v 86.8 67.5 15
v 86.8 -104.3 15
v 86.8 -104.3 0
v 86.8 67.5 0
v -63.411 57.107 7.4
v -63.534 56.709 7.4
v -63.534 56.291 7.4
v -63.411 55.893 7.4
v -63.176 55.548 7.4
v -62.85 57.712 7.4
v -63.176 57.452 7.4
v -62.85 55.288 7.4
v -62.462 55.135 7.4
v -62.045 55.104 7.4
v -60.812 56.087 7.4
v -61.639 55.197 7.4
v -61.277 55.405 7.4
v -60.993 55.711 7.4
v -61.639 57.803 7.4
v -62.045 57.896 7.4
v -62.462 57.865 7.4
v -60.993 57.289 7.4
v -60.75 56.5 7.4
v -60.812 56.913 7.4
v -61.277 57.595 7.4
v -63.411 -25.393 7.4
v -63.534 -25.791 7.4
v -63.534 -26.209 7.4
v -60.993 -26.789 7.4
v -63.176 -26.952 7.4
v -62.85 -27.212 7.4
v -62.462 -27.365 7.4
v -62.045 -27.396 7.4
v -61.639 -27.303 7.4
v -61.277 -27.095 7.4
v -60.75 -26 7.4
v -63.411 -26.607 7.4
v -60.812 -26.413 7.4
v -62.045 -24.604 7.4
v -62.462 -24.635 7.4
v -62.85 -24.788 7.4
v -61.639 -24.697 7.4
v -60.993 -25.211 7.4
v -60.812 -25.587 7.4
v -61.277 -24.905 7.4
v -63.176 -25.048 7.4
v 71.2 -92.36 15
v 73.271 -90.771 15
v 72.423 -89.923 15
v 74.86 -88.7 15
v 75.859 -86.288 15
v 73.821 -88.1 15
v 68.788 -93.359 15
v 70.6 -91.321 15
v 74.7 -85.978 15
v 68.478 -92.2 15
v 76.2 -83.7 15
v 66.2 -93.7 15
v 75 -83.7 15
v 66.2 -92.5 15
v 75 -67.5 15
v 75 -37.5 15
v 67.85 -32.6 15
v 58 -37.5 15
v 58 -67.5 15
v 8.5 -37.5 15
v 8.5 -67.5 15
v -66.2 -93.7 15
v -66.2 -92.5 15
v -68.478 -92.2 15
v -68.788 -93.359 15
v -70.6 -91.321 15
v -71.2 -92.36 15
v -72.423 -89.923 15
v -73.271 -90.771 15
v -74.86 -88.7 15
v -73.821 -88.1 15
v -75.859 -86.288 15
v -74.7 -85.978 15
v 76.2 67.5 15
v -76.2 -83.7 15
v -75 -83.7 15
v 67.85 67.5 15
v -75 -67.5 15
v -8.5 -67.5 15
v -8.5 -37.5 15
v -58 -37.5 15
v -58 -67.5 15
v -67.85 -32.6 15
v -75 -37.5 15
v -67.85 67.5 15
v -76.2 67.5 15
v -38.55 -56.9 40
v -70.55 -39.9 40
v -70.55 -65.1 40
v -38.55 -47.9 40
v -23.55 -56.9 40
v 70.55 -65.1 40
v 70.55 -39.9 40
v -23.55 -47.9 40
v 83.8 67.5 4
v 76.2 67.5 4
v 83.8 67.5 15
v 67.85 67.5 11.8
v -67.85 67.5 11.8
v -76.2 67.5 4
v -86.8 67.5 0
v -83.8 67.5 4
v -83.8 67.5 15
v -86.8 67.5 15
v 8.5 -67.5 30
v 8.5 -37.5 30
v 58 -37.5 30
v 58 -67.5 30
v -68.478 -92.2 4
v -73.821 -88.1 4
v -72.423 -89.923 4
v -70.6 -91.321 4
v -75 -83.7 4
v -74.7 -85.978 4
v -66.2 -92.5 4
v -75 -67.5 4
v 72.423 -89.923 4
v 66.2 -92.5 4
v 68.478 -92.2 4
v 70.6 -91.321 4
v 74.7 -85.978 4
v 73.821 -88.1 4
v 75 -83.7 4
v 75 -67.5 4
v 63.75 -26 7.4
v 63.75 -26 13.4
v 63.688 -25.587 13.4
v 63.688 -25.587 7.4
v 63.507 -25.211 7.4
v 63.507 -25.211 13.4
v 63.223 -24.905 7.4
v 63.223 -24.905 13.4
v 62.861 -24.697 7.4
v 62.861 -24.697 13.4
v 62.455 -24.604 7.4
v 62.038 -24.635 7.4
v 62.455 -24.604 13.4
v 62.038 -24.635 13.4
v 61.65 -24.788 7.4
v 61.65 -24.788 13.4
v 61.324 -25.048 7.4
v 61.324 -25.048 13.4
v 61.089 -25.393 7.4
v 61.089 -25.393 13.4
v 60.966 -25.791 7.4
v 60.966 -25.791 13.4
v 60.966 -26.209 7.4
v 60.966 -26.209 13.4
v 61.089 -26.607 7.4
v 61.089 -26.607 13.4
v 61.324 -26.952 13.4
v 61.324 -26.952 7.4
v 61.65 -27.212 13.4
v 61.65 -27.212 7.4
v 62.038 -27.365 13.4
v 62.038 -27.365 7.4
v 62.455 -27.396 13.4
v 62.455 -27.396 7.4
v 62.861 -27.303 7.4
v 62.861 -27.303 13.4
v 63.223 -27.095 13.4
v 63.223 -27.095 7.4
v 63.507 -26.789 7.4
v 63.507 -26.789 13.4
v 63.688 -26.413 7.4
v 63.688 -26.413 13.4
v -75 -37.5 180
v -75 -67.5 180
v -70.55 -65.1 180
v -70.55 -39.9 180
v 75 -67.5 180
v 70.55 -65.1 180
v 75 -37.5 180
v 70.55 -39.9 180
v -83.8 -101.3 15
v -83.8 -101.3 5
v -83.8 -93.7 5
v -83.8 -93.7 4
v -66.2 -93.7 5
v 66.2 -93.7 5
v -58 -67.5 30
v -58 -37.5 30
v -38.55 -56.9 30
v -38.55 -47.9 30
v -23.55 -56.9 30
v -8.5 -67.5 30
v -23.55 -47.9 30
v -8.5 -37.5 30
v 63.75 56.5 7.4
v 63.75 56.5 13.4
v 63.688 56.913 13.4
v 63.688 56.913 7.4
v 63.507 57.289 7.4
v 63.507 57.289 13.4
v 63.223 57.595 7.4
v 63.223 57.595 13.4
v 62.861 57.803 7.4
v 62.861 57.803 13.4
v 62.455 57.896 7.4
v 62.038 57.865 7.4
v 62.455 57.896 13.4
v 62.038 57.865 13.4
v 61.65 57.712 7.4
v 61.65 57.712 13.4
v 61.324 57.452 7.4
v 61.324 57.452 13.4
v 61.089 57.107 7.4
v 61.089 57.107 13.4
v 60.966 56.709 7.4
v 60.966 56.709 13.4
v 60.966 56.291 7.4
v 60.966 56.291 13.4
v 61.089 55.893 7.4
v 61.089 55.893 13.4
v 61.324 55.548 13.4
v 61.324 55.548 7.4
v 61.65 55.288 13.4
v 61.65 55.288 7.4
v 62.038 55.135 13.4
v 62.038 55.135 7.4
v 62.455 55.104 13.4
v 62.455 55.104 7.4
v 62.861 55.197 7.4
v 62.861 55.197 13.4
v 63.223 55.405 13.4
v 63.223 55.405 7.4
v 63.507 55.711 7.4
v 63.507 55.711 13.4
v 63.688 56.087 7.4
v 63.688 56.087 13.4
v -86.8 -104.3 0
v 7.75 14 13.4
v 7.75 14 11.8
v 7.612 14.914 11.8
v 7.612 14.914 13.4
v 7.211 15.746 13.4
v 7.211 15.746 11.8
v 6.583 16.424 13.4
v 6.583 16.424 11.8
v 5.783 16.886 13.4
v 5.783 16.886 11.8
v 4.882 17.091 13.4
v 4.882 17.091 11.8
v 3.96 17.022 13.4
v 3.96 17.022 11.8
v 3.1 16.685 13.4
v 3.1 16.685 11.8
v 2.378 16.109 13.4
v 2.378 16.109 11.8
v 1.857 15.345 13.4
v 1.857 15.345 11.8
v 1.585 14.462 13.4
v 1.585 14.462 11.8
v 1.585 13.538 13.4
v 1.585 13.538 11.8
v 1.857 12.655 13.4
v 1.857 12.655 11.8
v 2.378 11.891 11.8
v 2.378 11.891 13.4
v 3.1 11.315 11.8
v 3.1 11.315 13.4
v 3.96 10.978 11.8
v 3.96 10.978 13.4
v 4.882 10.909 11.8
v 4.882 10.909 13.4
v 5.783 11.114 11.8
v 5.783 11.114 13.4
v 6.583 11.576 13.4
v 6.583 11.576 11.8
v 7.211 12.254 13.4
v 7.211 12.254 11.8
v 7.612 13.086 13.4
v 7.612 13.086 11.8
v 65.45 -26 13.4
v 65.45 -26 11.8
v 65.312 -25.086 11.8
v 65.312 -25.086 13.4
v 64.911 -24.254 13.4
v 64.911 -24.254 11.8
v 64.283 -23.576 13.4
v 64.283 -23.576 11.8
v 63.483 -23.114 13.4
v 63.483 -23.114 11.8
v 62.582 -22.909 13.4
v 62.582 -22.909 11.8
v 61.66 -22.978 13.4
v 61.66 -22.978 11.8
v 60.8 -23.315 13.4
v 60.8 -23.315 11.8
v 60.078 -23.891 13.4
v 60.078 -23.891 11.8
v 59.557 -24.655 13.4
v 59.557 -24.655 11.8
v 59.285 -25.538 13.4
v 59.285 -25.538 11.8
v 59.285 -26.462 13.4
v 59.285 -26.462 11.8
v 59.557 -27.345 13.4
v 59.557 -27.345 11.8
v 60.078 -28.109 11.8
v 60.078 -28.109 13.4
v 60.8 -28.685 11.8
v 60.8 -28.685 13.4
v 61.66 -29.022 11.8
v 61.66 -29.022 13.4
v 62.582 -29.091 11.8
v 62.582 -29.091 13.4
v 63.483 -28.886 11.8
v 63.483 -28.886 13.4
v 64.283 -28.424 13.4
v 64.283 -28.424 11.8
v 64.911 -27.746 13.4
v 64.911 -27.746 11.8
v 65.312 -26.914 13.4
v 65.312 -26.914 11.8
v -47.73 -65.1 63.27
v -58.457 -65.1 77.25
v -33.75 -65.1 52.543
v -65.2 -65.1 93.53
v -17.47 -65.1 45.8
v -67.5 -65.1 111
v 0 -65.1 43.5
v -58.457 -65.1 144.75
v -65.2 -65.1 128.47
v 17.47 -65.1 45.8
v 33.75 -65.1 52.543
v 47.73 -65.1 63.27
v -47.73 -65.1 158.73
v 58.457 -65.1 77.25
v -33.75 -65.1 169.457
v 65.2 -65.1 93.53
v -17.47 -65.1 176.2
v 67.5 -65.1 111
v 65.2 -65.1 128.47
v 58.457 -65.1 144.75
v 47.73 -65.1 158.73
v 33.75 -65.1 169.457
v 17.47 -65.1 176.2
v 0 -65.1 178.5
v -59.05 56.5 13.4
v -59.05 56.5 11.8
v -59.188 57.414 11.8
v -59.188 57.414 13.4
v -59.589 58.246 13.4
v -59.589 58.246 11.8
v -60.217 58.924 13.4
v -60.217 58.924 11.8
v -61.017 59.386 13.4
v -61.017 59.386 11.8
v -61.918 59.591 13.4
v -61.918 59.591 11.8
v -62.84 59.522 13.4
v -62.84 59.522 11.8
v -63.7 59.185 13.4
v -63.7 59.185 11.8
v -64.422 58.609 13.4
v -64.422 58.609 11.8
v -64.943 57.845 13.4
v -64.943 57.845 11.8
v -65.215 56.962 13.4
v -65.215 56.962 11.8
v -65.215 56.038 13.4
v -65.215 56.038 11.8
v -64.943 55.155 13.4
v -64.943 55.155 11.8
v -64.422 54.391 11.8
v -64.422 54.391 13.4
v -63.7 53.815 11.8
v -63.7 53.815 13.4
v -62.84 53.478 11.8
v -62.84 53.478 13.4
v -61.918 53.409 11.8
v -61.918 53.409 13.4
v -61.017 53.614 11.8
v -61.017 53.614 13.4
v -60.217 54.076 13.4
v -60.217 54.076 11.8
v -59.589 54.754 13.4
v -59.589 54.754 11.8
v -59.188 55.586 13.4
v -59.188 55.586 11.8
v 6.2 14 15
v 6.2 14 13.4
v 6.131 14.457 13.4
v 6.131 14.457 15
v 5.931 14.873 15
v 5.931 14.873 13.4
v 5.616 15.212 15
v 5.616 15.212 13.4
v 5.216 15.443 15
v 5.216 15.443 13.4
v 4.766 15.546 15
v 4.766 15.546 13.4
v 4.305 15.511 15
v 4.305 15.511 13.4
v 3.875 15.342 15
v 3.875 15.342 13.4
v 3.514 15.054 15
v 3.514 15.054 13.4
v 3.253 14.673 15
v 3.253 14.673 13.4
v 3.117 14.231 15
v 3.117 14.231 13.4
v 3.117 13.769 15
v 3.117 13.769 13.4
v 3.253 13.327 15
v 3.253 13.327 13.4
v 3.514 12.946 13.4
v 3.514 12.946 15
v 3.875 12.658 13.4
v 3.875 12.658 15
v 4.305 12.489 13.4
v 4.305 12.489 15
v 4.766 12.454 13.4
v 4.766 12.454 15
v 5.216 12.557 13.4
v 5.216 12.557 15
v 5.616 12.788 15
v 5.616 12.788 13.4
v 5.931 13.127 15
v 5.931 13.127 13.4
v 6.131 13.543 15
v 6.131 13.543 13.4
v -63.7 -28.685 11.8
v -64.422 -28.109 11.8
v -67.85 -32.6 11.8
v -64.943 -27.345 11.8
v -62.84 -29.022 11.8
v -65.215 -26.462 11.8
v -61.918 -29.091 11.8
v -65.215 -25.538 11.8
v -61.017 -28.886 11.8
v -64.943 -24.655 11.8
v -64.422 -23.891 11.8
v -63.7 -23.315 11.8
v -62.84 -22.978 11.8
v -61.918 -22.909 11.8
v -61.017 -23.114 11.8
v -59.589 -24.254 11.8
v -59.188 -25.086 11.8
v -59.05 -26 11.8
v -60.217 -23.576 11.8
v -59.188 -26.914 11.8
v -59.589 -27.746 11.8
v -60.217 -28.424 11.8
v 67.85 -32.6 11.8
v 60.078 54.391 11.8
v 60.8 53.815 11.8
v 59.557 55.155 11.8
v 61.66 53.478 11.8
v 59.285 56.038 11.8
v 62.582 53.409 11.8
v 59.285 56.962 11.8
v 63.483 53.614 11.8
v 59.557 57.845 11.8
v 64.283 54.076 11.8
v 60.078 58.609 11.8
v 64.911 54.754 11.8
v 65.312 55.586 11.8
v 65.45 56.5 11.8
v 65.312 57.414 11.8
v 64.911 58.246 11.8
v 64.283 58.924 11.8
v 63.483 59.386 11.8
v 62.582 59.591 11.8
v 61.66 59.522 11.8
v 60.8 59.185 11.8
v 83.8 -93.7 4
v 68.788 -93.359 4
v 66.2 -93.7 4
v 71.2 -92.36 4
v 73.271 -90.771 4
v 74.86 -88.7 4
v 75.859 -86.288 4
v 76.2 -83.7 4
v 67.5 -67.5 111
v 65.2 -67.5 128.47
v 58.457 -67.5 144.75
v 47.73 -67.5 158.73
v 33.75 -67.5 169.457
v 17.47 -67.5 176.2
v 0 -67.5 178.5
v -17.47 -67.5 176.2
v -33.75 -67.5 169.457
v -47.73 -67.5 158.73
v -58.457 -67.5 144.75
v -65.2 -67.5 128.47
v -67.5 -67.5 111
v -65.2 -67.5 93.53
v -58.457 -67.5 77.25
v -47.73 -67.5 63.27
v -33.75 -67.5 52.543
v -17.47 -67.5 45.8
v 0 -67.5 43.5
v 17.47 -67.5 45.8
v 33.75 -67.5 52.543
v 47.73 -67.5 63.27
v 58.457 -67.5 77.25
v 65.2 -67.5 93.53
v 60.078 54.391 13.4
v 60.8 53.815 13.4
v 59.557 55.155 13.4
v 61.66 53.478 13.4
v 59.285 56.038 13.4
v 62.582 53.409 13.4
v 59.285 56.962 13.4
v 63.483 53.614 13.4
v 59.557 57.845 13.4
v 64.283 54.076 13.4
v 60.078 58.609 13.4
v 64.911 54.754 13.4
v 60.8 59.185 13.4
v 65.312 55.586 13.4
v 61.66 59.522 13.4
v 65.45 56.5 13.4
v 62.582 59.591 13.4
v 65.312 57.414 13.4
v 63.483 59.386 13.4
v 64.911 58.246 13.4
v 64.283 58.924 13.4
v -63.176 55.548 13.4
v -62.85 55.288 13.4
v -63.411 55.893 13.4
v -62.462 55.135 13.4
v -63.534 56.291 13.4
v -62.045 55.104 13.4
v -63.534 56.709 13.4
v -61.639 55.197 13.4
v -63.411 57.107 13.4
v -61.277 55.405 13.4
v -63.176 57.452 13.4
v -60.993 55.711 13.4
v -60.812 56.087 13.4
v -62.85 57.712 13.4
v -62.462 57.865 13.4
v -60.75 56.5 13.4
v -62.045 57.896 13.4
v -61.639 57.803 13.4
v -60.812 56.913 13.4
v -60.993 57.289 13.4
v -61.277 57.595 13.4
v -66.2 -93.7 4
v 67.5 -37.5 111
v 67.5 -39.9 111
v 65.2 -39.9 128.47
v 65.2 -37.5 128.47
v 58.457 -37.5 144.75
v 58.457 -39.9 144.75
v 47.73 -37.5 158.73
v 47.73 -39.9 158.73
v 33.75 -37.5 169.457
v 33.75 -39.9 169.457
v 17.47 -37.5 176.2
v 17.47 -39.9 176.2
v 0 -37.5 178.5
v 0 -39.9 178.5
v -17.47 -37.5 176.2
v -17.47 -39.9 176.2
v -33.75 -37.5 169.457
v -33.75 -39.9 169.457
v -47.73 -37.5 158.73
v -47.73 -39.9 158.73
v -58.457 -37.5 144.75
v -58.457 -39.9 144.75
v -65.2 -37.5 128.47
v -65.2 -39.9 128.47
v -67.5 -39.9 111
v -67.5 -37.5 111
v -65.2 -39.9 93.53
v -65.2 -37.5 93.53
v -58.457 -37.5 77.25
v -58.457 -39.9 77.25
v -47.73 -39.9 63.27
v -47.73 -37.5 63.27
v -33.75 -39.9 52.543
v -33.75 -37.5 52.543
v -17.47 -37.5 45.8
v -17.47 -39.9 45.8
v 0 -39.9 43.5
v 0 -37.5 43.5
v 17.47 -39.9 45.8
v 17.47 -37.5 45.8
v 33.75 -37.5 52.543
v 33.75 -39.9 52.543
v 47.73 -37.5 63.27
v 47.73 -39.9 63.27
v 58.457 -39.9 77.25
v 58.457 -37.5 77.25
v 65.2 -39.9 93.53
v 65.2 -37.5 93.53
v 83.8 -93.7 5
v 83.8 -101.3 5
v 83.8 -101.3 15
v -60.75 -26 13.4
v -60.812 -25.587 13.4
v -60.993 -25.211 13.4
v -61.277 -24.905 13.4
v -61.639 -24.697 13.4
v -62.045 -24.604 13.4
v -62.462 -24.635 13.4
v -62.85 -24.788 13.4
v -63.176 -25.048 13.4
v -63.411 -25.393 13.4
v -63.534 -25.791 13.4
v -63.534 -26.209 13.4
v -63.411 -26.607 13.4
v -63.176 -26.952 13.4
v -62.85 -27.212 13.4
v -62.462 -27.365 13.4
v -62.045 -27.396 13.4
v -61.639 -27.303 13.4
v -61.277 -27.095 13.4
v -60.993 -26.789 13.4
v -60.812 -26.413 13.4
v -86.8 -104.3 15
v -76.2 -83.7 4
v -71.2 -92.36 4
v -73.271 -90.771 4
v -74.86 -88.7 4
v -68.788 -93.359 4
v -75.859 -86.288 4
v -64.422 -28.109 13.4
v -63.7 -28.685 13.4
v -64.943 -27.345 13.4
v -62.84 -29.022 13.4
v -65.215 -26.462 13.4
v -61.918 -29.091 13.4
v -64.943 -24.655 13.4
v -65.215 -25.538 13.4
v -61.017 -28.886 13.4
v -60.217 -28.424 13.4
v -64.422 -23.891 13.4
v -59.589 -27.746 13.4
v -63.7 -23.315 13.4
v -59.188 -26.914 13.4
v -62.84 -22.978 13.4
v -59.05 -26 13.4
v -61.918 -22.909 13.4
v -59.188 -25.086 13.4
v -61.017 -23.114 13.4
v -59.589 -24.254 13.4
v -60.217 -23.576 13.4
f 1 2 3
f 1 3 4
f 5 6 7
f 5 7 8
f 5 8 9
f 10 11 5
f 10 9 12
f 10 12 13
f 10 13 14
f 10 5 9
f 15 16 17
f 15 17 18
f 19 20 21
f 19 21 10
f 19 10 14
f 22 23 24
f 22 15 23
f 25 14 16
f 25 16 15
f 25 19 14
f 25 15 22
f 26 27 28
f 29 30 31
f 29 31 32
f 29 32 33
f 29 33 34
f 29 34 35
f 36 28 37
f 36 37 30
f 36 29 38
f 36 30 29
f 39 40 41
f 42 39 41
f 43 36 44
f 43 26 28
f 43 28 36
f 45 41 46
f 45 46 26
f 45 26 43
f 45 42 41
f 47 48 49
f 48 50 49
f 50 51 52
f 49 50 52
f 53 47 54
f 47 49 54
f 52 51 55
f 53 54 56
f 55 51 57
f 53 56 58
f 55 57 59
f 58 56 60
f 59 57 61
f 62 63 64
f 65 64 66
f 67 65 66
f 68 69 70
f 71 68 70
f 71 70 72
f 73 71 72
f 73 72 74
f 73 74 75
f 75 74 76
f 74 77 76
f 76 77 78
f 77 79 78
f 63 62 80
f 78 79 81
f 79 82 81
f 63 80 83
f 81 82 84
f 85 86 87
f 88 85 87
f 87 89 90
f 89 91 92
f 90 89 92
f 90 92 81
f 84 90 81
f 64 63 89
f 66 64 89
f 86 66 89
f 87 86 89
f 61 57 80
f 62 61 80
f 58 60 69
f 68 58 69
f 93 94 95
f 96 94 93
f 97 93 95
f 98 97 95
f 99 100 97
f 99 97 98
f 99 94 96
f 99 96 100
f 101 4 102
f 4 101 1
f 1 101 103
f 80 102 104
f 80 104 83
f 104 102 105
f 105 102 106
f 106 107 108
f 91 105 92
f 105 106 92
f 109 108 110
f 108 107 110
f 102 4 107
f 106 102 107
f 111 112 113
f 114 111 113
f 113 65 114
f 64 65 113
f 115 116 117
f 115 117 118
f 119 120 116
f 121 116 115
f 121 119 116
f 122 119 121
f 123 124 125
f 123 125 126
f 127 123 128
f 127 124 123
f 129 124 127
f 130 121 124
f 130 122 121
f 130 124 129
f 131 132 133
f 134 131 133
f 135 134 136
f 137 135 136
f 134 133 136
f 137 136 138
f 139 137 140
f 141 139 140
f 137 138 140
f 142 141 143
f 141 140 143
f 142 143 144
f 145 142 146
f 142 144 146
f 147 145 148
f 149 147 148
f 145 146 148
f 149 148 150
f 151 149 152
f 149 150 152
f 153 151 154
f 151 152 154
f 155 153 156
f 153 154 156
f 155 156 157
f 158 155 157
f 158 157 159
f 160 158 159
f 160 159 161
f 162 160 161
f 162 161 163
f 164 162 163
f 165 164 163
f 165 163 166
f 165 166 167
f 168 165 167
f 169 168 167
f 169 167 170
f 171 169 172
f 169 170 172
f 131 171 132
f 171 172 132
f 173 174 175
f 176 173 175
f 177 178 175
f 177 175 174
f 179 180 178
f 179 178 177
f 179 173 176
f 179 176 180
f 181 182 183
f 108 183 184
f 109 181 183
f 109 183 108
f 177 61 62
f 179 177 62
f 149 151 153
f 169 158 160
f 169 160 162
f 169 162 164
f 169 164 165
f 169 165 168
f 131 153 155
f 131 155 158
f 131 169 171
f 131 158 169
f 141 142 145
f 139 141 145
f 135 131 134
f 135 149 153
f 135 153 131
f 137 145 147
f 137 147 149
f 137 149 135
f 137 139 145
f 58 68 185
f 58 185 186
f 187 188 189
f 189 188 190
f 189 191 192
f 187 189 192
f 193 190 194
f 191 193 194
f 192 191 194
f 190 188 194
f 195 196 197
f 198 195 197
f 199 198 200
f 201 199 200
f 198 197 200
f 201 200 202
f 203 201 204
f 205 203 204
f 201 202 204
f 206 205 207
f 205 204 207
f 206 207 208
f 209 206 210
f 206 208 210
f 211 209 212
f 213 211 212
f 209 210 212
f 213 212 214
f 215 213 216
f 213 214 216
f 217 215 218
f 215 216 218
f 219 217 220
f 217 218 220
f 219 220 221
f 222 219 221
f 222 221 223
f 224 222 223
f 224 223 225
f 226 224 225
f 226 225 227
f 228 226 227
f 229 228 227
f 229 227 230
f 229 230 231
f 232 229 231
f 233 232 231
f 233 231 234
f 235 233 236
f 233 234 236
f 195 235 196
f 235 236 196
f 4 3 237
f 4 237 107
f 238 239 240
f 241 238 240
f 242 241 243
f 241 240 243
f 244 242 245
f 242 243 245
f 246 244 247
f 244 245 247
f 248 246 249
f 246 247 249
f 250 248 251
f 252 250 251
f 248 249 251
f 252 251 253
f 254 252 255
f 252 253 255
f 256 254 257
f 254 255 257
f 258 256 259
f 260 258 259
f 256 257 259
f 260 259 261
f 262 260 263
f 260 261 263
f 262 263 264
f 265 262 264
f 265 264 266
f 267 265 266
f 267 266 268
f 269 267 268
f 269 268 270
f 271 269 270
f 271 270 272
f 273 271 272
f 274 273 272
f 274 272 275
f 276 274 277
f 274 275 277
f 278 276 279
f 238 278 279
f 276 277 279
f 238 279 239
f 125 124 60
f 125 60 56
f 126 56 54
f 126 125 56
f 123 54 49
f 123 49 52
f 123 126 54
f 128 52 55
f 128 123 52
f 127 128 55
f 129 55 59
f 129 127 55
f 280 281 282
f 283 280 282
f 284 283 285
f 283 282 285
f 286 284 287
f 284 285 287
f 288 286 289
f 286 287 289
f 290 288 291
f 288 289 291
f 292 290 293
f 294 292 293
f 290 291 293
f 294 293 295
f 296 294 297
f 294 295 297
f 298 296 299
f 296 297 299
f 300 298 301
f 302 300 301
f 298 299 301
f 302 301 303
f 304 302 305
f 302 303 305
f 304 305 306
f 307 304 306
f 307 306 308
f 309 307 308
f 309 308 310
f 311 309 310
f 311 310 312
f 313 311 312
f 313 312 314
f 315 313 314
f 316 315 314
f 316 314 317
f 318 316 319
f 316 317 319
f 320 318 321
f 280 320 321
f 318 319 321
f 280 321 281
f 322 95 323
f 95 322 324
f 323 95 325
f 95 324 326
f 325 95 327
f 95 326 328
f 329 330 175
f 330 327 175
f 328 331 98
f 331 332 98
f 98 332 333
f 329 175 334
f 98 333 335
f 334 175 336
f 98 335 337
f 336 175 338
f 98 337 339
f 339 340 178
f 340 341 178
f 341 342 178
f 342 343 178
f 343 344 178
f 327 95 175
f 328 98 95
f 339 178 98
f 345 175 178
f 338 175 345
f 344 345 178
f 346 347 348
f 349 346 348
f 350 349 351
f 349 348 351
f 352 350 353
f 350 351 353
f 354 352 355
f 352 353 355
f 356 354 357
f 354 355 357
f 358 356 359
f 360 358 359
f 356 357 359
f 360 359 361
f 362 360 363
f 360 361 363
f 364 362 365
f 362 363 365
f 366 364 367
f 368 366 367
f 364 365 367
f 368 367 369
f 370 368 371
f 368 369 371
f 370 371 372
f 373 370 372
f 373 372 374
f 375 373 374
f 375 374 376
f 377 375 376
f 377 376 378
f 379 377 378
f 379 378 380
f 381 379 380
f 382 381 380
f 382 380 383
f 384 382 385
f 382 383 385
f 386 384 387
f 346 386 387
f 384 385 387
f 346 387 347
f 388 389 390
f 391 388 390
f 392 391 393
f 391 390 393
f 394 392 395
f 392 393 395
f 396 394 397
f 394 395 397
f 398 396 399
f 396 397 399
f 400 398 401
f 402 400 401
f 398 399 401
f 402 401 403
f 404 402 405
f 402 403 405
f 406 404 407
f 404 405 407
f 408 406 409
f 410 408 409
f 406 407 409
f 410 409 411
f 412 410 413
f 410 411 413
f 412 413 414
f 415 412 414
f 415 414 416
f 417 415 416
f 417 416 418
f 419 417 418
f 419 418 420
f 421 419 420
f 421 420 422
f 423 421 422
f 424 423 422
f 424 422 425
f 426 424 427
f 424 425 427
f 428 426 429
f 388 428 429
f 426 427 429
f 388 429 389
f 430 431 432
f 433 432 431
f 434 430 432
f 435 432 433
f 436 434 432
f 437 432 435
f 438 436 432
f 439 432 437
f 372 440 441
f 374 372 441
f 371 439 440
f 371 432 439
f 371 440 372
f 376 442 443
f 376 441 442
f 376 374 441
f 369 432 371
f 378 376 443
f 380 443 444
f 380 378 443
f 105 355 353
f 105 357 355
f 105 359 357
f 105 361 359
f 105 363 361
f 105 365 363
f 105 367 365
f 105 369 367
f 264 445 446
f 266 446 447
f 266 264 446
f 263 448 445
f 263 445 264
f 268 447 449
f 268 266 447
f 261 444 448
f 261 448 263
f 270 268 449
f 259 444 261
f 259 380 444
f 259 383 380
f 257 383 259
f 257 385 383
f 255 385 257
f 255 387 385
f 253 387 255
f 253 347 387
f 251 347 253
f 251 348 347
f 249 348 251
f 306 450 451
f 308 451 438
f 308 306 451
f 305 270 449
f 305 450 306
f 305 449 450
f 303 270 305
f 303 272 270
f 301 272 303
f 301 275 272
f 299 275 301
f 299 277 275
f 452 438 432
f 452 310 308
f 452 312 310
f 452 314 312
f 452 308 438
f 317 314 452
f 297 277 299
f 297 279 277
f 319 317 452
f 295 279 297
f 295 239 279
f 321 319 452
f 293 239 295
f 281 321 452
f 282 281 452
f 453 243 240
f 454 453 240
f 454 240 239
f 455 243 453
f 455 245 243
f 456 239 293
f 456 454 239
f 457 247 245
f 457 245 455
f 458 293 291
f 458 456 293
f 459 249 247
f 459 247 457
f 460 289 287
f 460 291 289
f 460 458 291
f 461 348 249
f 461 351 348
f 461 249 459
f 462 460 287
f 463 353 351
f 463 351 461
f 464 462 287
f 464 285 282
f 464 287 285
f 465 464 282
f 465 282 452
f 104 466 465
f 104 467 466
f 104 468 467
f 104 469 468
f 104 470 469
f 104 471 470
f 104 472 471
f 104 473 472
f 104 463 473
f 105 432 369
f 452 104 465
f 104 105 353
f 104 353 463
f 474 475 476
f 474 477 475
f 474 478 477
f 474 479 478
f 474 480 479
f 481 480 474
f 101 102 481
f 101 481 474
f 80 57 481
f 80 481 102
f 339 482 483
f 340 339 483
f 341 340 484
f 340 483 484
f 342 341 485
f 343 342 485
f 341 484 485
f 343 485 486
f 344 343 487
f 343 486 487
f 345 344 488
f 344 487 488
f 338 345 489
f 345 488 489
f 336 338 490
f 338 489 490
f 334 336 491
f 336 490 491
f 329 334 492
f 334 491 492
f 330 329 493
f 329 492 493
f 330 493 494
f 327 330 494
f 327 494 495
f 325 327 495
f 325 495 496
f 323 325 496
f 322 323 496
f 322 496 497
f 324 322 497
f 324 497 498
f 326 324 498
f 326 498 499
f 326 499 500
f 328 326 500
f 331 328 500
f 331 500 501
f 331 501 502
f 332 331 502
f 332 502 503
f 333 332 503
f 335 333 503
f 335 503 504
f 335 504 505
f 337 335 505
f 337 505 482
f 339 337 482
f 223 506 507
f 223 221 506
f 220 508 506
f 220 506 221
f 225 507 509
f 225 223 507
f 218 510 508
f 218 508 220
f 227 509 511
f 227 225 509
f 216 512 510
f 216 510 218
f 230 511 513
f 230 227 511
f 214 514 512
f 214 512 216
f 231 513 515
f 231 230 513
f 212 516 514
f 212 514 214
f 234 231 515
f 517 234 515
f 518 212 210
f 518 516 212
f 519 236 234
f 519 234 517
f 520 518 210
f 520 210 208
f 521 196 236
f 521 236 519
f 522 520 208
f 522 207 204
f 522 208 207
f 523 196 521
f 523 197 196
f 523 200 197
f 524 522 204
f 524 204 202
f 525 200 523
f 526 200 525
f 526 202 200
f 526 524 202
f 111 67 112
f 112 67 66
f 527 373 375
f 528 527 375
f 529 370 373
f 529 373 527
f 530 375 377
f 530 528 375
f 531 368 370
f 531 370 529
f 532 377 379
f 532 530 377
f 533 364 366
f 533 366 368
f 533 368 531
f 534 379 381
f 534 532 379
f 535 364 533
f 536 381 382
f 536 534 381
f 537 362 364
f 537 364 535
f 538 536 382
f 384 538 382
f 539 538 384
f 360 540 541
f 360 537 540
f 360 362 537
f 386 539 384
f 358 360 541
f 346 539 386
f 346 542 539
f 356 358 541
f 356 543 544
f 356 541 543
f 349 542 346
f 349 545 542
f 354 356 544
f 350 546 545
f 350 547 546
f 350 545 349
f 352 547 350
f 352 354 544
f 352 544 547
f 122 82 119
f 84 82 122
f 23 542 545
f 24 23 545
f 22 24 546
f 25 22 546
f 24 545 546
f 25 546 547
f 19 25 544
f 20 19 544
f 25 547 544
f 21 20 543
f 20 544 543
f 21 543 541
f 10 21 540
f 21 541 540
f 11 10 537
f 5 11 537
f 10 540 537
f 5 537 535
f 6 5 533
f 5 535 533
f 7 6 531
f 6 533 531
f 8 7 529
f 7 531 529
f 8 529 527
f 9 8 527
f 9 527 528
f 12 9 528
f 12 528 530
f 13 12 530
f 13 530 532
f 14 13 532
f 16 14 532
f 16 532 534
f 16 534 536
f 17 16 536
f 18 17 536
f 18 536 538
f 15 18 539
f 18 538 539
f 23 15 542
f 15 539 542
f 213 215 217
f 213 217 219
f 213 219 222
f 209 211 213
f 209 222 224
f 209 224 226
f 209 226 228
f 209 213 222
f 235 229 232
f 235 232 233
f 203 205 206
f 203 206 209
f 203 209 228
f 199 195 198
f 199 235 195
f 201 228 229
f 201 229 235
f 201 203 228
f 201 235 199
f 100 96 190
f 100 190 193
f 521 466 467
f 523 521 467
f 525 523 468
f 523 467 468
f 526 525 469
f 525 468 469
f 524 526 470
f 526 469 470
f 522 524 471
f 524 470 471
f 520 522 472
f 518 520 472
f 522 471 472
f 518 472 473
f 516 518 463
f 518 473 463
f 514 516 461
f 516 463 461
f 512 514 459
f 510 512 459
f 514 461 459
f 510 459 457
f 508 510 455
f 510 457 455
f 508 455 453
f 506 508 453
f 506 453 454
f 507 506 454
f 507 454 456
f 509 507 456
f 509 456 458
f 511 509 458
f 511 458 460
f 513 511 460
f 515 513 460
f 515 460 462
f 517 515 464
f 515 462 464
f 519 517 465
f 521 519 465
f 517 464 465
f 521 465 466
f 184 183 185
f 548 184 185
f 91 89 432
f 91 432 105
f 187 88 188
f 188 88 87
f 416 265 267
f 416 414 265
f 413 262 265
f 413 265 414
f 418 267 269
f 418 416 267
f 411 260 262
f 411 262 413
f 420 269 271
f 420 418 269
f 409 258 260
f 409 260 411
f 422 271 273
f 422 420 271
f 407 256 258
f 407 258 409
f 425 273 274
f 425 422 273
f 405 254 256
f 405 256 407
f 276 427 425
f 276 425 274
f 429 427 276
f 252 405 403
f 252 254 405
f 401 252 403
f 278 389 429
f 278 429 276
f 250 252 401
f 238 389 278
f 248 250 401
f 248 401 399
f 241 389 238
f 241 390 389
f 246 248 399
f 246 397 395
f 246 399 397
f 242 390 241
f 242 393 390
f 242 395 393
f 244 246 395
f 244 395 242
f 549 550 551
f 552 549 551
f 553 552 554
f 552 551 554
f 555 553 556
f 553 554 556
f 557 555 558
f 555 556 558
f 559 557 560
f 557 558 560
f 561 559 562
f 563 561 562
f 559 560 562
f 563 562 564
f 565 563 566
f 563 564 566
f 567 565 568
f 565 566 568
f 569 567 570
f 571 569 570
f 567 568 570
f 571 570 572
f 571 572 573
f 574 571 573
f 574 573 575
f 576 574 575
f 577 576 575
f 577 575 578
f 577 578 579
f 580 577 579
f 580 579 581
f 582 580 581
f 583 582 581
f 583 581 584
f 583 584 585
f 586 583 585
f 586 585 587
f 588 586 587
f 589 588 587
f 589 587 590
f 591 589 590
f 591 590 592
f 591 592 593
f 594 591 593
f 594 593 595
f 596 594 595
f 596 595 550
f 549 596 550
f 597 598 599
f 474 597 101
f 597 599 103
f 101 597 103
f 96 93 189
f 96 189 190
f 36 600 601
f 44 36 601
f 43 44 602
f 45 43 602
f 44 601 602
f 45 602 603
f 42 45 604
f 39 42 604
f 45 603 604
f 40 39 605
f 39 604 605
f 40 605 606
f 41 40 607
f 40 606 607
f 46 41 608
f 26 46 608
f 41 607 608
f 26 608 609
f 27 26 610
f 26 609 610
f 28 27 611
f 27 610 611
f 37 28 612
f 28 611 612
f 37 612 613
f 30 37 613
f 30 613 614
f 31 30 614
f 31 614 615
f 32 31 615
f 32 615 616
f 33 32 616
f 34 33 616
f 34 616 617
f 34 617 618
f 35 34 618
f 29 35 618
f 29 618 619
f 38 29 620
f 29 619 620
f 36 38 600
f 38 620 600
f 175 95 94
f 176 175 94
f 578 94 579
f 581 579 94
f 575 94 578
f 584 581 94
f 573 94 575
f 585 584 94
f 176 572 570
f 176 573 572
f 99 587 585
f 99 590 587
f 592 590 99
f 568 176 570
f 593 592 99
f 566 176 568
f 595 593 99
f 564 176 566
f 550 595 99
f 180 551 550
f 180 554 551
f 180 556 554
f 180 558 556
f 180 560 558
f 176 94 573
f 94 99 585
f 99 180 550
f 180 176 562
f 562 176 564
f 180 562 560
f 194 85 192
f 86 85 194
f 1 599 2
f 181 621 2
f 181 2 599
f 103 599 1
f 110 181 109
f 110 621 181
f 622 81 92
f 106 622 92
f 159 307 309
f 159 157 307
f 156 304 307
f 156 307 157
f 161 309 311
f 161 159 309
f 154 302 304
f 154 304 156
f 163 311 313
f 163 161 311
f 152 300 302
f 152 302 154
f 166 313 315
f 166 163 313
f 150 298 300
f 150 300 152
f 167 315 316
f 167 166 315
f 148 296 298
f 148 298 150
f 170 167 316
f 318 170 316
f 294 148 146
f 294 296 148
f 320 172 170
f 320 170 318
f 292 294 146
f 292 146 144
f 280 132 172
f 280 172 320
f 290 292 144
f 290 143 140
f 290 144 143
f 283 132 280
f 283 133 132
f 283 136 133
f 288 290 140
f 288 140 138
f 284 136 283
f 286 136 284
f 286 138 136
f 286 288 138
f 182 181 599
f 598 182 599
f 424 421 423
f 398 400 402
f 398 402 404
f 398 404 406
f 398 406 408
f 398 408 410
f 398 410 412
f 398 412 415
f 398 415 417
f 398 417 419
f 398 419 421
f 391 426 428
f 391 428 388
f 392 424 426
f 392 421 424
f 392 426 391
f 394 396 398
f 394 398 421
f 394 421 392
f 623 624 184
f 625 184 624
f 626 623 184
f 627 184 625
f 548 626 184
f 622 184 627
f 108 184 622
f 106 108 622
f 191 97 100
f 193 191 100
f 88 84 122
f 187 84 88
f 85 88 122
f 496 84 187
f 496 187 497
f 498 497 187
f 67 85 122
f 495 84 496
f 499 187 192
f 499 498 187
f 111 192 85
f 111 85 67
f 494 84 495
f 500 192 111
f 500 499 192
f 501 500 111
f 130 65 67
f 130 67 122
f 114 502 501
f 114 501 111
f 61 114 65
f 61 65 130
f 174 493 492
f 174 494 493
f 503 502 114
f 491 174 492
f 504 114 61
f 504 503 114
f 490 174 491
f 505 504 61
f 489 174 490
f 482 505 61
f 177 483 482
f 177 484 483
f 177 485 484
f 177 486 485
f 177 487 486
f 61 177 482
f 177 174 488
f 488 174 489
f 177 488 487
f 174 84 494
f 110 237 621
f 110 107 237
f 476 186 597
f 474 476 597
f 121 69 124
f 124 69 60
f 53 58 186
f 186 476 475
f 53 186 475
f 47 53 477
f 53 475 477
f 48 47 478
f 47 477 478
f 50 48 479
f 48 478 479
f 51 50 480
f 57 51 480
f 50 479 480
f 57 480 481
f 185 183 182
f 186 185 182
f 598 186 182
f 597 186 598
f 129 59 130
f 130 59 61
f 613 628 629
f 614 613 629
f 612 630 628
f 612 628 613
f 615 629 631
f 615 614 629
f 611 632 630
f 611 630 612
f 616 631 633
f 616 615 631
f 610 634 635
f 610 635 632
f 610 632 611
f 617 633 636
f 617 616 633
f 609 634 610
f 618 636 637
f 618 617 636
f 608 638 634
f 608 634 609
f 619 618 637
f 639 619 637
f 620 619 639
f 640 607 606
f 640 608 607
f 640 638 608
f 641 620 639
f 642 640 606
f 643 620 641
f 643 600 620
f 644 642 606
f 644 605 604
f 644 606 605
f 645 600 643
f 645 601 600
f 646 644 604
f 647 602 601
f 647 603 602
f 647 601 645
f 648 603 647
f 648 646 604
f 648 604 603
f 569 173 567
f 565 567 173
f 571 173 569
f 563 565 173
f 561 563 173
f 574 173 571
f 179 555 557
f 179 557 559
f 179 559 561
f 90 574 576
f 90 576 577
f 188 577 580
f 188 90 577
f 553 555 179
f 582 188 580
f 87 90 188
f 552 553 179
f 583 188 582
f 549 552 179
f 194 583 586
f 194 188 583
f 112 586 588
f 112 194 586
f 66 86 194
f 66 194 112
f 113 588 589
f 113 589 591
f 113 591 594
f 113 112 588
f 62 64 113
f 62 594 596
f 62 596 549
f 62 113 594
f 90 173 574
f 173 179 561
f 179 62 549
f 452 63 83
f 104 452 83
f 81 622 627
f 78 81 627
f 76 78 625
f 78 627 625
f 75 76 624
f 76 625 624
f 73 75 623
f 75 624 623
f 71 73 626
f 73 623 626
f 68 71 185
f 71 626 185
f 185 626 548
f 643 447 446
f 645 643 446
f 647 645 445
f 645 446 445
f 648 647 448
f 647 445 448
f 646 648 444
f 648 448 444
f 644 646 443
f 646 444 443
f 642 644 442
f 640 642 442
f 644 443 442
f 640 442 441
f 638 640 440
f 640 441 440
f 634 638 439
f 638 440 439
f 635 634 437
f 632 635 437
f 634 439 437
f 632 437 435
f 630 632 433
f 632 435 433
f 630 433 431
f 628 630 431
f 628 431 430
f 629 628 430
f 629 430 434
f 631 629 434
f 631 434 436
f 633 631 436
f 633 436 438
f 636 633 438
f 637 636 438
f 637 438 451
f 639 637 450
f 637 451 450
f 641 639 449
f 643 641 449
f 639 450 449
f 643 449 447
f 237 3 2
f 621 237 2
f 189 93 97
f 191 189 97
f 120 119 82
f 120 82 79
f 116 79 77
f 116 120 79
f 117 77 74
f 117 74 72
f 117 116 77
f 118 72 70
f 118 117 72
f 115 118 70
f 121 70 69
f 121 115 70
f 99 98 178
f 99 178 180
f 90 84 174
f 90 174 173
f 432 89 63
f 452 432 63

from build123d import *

# Parameters (mm, degrees)
SKETCH_W        = 150
SKETCH_H        = 135
PAD_DEPTH       = 15
SKETCH001_W     = 17
SKETCH001_H     = 30
PAD001_DEPTH    = 15
SKETCH002_W     = 150
SKETCH002_H     = 30
PAD002_DEPTH    = 150
SKETCH003_W     = 141.1
SKETCH003_H     = 25.2
POCKET_DEPTH    = 140
SKETCH004_W     = 15
SKETCH004_H     = 9
POCKET001_DEPTH = 10
SKETCH005_R     = 67.5
POCKET002_DEPTH = 30
SKETCH006_W     = 135.7
SKETCH006_H     = 100.1
POCKET003_DEPTH = 3.2
SKETCH007_R     = 3.1
PAD003_DEPTH    = 1.6
SKETCH008_R     = 1.4
POCKET004_DEPTH = 6
SKETCH009_R     = 1.55
PAD004_DEPTH    = 1.6
SKETCH010_W     = 135
SKETCH010_H     = 15
PAD005_DEPTH    = 10
SKETCH011_W     = 135
SKETCH011_H     = 15
PAD006_DEPTH    = 10
SKETCH012_W     = 7.6
SKETCH012_H     = 135
POCKET005_DEPTH = 11
SKETCH013_W     = 170
SKETCH013_H     = 15
PAD007_DEPTH    = 35
SKETCH014_W     = 150
SKETCH014_H     = 25
POCKET006_DEPTH = 11
SKETCH015_W     = 7.6
SKETCH015_H     = 26.2
POCKET007_DEPTH = 11
SKETCH016_W     = 167.6
SKETCH016_H     = 7.6
POCKET008_DEPTH = 10
SKETCH017_W     = 10
SKETCH017_H     = 10
POCKET009_DEPTH = 11
PAD008_DEPTH    = 11
SKETCH019_W     = 170
SKETCH019_H     = 15
PAD009_DEPTH    = 1.8
SKETCH020_W     = 171.8
SKETCH020_H     = 15
PAD010_DEPTH    = 1.8
SKETCH021_W     = 171.8
SKETCH021_H     = 15
PAD011_DEPTH    = 1.8


with BuildPart() as part:
    # Sketch → Pad (new body)
    with BuildSketch(Plane.XY):
        Rectangle(SKETCH_W, SKETCH_H)
    extrude(amount=PAD_DEPTH)

    # Sketch001 (on Face6 of Pad) → Pad001 (join)
    with BuildSketch(Plane.XY.offset(15)):
        with Locations((-66.5, -52.5)):
            Rectangle(SKETCH001_W, SKETCH001_H)
        with Locations((0, -52.5)):
            Rectangle(SKETCH001_W, SKETCH001_H)
        with Locations((66.5, -52.5)):
            Rectangle(SKETCH001_W, SKETCH001_H)
    extrude(amount=PAD001_DEPTH)

    # Sketch002 (on Face18 of Pad001) → Pad002 (join)
    with BuildSketch(Plane.XY.offset(30)):
        with Locations((0, -52.5)):
            Rectangle(SKETCH002_W, SKETCH002_H)
    extrude(amount=PAD002_DEPTH)

    # Sketch003 (on Face24 of Pad002) → Pocket (cut)
    with BuildSketch(Plane.XY.offset(180)):
        with Locations((0, -52.5)):
            Rectangle(SKETCH003_W, SKETCH003_H)
    extrude(amount=-POCKET_DEPTH, mode=Mode.SUBTRACT)

    # Sketch004 (on Face30 of Pocket) → Pocket001 (cut)
    with BuildSketch(Plane.XY.offset(40)):
        with Locations((-31.05, -52.4)):
            Rectangle(SKETCH004_W, SKETCH004_H)
    extrude(amount=-POCKET001_DEPTH, mode=Mode.SUBTRACT)

    # Sketch005 (on Face20 of Pocket001) → Pocket002 (cut)
    with BuildSketch(Plane.XZ.offset(67.5)):
        with Locations((0, 111)):
            Circle(SKETCH005_R)
    extrude(amount=-POCKET002_DEPTH, mode=Mode.SUBTRACT)

    # Sketch006 (on Face5 of Pocket002) → Pocket003 (cut)
    with BuildSketch(Plane.XY.offset(15)):
        with Locations((0, 17.45)):
            Rectangle(SKETCH006_W, SKETCH006_H)
    extrude(amount=-POCKET003_DEPTH, mode=Mode.SUBTRACT)

    # Sketch007 (on Face8 of Pocket003) → Pad003 (join)
    with BuildSketch(Plane.XY.offset(11.8)):
        with Locations((-62.15, 56.5)):
            Circle(SKETCH007_R)
        with Locations((-62.15, -26)):
            Circle(SKETCH007_R)
        with Locations((62.35, -26)):
            Circle(SKETCH007_R)
        with Locations((62.35, 56.5)):
            Circle(SKETCH007_R)
        with Locations((4.65, 14)):
            Circle(SKETCH007_R)
    extrude(amount=PAD003_DEPTH)

    # Sketch008 (on Face37 of Pad003) → Pocket004 (cut)
    with BuildSketch(Plane.XY.offset(13.4)):
        with Locations((-62.15, 56.5)):
            Circle(SKETCH008_R)
        with Locations((62.35, -26)):
            Circle(SKETCH008_R)
        with Locations((62.35, 56.5)):
            Circle(SKETCH008_R)
        with Locations((-62.15, -26)):
            Circle(SKETCH008_R)
    extrude(amount=-POCKET004_DEPTH, mode=Mode.SUBTRACT)

    # Sketch009 (on Face36 of Pocket004) → Pad004 (join)
    with BuildSketch(Plane.XY.offset(13.4)):
        with Locations((4.65, 14)):
            Circle(SKETCH009_R)
    extrude(amount=PAD004_DEPTH)

    # Sketch010 (on Face10 of Pad004) → Pad005 (join)
    with BuildSketch(Plane.YZ.offset(75)):
        with Locations((0, 7.5)):
            Rectangle(SKETCH010_W, SKETCH010_H)
    extrude(amount=PAD005_DEPTH)

    # Sketch011 (on Face1 of Pad005) → Pad006 (join)
    with BuildSketch(Plane(origin=(-75, 0, 0), x_dir=(0, -1, 0), z_dir=(-1, 0, 0))):
        with Locations((0, 7.5)):
            Rectangle(SKETCH011_W, SKETCH011_H)
    extrude(amount=PAD006_DEPTH)

    # Sketch012 (on Face14 of Pad006) → Pocket005 (cut)
    with BuildSketch(Plane.XY.offset(15)):
        with Locations((-80, 0)):
            Rectangle(SKETCH012_W, SKETCH012_H)
        with Locations((80, 0)):
            Rectangle(SKETCH012_W, SKETCH012_H)
    extrude(amount=-POCKET005_DEPTH, mode=Mode.SUBTRACT)

    # Sketch013 (on Face10 of Pocket005) → Pad007 (join)
    with BuildSketch(Plane.XZ.offset(67.5)):
        with Locations((0, 7.5)):
            Rectangle(SKETCH013_W, SKETCH013_H)
    extrude(amount=PAD007_DEPTH)

    # Sketch014 (on Face21 of Pad007) → Pocket006 (cut)
    with BuildSketch(Plane.XY.offset(15)):
        with Locations((0, -80)):
            Rectangle(SKETCH014_W, SKETCH014_H)
    extrude(amount=-POCKET006_DEPTH, mode=Mode.SUBTRACT)

    # Sketch015 (on Face42 of Pocket006) → Pocket007 (cut)
    with BuildSketch(Plane.XY.offset(15)):
        with Locations((-80, -80.6)):
            Rectangle(SKETCH015_W, SKETCH015_H)
        with Locations((80, -80.6)):
            Rectangle(SKETCH015_W, SKETCH015_H)
    extrude(amount=-POCKET007_DEPTH, mode=Mode.SUBTRACT)

    # Sketch016 (on Face42 of Pocket007) → Pocket008 (cut)
    with BuildSketch(Plane.XY.offset(15)):
        with Locations((0, -97.5)):
            Rectangle(SKETCH016_W, SKETCH016_H)
    extrude(amount=-POCKET008_DEPTH, mode=Mode.SUBTRACT)

    # Sketch017 (on Face42 of Pocket008) → Pocket009 (cut)
    with BuildSketch(Plane.XY.offset(15)):
        with Locations((-71.2, -88.7)):
            Rectangle(SKETCH017_W, SKETCH017_H)
        with Locations((71.2, -88.7)):
            Rectangle(SKETCH017_W, SKETCH017_H)
    extrude(amount=-POCKET009_DEPTH, mode=Mode.SUBTRACT)

    # Sketch018 (on Face80 of Pocket009) → Pad008 (join)
    with BuildSketch(Plane.XY.offset(4)):
        with BuildLine():
            ThreePointArc((66.2, -92.5), (72.42254, -89.92254), (75, -83.7))
            Line((75, -83.7), (76.2, -83.7))
            ThreePointArc((66.2, -93.7), (73.271068, -90.771068), (76.2, -83.7))
            Line((66.2, -93.7), (66.2, -92.5))
        make_face()
        with BuildLine():
            ThreePointArc((-75, -83.7), (-72.42254, -89.92254), (-66.2, -92.5))
            Line((-66.2, -93.7), (-66.2, -92.5))
            ThreePointArc((-76.2, -83.7), (-73.271068, -90.771068), (-66.2, -93.7))
            Line((-76.2, -83.7), (-75, -83.7))
        make_face()
    extrude(amount=PAD008_DEPTH)

    # Sketch019 (on Face17 of Pad008) → Pad009 (join)
    with BuildSketch(Plane(origin=(-85, 0, 0), x_dir=(0, -1, 0), z_dir=(-1, 0, 0))):
        with Locations((17.5, 7.5)):
            Rectangle(SKETCH019_W, SKETCH019_H)
    extrude(amount=PAD009_DEPTH)

    # Sketch020 (on Face40 of Pad009) → Pad010 (join)
    with BuildSketch(Plane.XZ.offset(102.5)):
        with Locations((-0.9, 7.5)):
            Rectangle(SKETCH020_W, SKETCH020_H)
    extrude(amount=PAD010_DEPTH)

    # Sketch021 (on Face39 of Pad010) → Pad011 (join)
    with BuildSketch(Plane.YZ.offset(85)):
        with Locations((-18.4, 7.5)):
            Rectangle(SKETCH021_W, SKETCH021_H)
    extrude(amount=PAD011_DEPTH)


solid = part.part
